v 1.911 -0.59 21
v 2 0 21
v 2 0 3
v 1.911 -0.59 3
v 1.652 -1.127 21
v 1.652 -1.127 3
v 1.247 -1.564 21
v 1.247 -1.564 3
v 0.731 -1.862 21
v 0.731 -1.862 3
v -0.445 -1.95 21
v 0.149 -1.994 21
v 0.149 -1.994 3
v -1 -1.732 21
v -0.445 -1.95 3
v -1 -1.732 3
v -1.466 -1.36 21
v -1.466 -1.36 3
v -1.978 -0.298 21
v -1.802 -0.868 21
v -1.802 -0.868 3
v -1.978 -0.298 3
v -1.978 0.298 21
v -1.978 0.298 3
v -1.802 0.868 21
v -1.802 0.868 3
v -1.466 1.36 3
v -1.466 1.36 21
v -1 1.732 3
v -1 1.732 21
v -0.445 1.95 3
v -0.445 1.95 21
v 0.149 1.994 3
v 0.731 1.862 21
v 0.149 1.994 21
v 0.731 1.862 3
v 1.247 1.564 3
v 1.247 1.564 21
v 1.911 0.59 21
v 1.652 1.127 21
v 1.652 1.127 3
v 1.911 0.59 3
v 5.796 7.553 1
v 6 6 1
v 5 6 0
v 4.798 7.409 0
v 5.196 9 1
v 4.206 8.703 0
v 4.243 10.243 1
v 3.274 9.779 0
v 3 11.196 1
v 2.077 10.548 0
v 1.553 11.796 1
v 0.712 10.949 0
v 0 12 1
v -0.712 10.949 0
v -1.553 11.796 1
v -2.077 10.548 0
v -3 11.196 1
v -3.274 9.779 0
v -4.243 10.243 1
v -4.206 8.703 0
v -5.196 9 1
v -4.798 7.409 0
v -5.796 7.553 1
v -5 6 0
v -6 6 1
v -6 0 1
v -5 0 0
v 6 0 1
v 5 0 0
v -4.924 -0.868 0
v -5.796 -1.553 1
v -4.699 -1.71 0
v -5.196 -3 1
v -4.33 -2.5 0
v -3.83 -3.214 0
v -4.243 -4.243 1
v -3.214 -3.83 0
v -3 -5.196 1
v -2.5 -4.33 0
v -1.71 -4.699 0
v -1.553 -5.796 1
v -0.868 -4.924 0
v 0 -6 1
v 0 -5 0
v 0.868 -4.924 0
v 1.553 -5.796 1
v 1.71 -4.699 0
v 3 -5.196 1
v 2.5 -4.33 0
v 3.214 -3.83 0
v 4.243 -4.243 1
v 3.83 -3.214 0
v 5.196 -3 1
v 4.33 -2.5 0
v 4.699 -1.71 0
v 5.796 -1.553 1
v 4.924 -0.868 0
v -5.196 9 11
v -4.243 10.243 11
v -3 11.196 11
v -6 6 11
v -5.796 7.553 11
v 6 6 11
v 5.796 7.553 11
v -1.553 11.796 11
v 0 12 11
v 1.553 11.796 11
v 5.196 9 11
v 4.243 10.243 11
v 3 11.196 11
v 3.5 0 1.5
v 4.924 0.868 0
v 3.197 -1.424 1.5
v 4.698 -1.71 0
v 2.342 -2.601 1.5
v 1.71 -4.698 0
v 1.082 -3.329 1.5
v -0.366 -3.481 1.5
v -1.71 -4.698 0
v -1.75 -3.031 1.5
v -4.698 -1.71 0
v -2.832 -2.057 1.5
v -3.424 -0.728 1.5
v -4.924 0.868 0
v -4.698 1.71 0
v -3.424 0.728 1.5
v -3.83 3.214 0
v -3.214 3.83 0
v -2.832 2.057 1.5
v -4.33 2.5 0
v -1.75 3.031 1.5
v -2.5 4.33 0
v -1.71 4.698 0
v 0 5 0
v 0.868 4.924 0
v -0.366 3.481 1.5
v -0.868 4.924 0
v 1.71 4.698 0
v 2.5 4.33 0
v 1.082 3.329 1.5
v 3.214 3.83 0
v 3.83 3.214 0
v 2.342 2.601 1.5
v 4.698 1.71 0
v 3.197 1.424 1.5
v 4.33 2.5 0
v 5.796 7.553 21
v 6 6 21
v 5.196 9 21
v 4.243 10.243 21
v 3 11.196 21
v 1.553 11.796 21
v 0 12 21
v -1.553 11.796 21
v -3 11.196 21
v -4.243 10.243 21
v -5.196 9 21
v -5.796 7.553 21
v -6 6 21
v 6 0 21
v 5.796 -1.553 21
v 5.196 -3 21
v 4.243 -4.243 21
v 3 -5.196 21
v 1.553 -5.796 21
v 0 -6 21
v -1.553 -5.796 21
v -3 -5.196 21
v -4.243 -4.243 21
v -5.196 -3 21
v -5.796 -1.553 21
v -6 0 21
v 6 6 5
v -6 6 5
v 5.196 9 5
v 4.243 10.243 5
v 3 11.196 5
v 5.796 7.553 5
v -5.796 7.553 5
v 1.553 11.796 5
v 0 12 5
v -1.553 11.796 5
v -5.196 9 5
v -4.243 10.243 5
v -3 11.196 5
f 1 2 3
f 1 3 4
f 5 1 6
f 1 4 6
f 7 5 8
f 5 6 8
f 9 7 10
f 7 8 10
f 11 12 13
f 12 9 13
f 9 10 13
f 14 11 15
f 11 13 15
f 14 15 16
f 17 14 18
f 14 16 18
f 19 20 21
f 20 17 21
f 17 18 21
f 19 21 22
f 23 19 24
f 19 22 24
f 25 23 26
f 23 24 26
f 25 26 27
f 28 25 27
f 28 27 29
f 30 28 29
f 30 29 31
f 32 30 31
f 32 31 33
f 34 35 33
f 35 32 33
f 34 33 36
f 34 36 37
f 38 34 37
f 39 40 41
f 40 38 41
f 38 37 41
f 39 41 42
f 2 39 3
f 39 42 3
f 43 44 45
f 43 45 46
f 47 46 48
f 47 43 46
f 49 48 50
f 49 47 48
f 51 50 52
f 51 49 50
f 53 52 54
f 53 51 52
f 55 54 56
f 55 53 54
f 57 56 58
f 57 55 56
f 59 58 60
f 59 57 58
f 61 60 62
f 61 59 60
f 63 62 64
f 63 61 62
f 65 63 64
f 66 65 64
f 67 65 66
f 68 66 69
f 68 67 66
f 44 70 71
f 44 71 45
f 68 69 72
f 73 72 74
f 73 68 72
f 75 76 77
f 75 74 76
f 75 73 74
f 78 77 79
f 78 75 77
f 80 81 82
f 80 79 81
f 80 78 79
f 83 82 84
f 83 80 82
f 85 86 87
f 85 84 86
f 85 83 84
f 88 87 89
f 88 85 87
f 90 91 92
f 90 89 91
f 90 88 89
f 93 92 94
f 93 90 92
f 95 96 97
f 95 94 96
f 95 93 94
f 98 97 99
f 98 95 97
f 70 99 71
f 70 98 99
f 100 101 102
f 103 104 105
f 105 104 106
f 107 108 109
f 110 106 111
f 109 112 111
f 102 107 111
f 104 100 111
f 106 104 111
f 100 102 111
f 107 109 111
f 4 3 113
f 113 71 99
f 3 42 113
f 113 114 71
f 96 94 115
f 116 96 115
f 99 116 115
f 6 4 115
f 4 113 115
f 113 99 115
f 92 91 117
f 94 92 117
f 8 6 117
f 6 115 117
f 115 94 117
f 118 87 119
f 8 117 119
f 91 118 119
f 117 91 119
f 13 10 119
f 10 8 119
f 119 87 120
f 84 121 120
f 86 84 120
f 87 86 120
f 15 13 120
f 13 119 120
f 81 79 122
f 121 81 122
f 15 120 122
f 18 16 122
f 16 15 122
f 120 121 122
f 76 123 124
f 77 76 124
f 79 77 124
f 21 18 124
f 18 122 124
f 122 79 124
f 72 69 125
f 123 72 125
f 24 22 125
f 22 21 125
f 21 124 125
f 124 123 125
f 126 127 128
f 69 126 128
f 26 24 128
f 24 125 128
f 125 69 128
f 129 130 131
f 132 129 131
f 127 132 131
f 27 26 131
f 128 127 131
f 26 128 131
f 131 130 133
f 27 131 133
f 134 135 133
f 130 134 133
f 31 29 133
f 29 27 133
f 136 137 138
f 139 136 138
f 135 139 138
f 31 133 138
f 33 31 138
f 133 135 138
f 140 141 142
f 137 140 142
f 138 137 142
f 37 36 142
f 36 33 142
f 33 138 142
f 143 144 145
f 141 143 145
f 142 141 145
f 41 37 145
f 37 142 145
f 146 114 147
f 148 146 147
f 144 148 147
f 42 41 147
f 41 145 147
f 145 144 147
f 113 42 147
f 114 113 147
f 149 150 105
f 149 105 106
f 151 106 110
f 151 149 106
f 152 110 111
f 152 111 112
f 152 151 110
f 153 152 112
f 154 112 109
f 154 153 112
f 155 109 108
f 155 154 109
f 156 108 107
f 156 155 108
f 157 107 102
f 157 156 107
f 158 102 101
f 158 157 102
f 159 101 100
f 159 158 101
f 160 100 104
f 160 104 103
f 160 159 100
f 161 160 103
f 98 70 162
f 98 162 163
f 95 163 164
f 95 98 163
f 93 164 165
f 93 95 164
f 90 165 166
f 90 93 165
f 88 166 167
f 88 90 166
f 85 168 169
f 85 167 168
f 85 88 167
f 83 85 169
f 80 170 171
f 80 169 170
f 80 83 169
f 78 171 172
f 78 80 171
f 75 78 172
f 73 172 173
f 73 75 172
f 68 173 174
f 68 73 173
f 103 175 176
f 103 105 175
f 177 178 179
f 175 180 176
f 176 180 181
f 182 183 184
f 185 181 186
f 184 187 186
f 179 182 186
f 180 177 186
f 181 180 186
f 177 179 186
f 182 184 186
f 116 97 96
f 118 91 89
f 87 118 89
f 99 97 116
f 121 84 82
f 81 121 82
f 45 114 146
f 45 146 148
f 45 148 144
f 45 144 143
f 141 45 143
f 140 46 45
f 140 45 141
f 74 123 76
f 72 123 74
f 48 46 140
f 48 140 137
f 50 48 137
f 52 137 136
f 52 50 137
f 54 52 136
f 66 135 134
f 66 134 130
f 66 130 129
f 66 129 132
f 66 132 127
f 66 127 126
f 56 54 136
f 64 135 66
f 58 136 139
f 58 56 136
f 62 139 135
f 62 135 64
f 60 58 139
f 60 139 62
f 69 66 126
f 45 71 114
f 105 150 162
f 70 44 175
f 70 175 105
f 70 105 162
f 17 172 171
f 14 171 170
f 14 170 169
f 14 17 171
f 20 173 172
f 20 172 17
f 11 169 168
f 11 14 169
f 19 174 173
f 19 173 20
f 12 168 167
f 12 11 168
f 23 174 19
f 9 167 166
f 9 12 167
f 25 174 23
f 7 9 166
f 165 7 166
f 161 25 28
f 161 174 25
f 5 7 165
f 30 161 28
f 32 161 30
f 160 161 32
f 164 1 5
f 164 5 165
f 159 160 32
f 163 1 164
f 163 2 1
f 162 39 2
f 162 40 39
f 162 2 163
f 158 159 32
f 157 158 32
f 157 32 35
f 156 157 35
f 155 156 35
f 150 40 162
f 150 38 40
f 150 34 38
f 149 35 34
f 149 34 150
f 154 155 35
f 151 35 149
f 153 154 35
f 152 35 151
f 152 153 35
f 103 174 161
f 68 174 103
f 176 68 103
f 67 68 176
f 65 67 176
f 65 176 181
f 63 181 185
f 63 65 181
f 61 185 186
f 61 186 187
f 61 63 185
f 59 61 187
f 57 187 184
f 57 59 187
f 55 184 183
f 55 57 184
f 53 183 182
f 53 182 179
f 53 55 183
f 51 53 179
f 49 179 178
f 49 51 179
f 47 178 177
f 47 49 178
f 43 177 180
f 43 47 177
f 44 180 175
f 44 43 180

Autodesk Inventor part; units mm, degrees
ref_plane "YZ Plane" through (0, 0, 0) normal (1, 0, 0) x (0, 1, 0)
ref_plane "XZ Plane" through (0, 0, 0) normal (0, 1, 0) x (-1, 0, 0)
ref_plane "XY Plane" through (0, 0, 0) normal (0, 0, 1) x (1, 0, 0)
sketch "Sketch2" plane through (0, 0, 0) normal (0, 0, 1) x (1, 0, 0)
  circle A0 centre (0, 0) radius 6
  circle A1 centre (0, 0) radius 2
  dimension "d0" = 12
  dimension "d1" = 4
extrude "Extrusion1" add sketch "Sketch2" along normal blind 21
sketch "Sketch3" plane through (0, 0, 21) normal (0, 0, 1) x (1, 0, 0)
  line L0 (0, 0) -> (0, 6) construction
  line L1 (6, 0) -> (6, 6)
  line L2 (-6, 6) -> (-6, 0)
  arc A0 (-6, 0) -> (6, 0) centre (0, 0) ccw
  arc A1 (6, 6) -> (-6, 6) centre (0, 6) ccw
  circle A2 centre (0, 0) radius 2 projected
  circle A3 centre (0, 0) radius 6 projected
  circle A4 centre (0, 0) radius 2 projected
  circle A5 centre (0, 0) radius 6 projected
  point P0 (0, 3)
  dimension "d4" = 6
  dimension "d5" = 6
extrude "Extrusion2" add sketch "Sketch3" against normal blind 10 contours A3 L2 A1 L1
sketch "Sketch4" plane through (0, 0, 0) normal (0, 0, -1) x (-1, 0, 0)
  arc A0 (6, 6) -> (-6, 6) centre (0, 6) ccw projected
  line L0 (-6, 6) -> (-6, 0) projected
  line L1 (6, 0) -> (6, 6) projected
  arc A1 (6, 0) -> (-6, 0) centre (0, 0) ccw projected
  circle A2 centre (0, 0) radius 2 projected
extrude "Extrusion3" add sketch "Sketch4" against normal blind 5 contours L1 A1 L0 A0
sketch "Sketch5" plane through (0, 0, 11) normal (0, 0, -1) x (-1, 0, 0)
  arc A0 (6, 6) -> (-6, 6) centre (0, 6) ccw projected
  line L0 (-6, 6) -> (-6, 0) projected
  line L1 (6, 0) -> (6, 6) projected
  arc A1 (6, 0) -> (-6, 0) centre (0, 0) ccw projected
  line L2 (-6, 6) -> (6, 6)
  arc A2 (6, 0) -> (-6, 0) centre (0, 0) ccw projected
  point P0 (0, 6)
extrude "Extrusion4" add sketch "Sketch5" along normal blind 6.4 contours L1 A1 L2 | L2 A1 L0
chamfer "Chamfer1" distance 3 angle 45 1 edges at (-2, 0, 0)
chamfer "Chamfer2" distance 1 angle 45 4 edges at (-6, 3, 0) (0, 12, 0) (6, 3, 0) (0, -6, 0)
properties part number "picture-fixings-6mm"
